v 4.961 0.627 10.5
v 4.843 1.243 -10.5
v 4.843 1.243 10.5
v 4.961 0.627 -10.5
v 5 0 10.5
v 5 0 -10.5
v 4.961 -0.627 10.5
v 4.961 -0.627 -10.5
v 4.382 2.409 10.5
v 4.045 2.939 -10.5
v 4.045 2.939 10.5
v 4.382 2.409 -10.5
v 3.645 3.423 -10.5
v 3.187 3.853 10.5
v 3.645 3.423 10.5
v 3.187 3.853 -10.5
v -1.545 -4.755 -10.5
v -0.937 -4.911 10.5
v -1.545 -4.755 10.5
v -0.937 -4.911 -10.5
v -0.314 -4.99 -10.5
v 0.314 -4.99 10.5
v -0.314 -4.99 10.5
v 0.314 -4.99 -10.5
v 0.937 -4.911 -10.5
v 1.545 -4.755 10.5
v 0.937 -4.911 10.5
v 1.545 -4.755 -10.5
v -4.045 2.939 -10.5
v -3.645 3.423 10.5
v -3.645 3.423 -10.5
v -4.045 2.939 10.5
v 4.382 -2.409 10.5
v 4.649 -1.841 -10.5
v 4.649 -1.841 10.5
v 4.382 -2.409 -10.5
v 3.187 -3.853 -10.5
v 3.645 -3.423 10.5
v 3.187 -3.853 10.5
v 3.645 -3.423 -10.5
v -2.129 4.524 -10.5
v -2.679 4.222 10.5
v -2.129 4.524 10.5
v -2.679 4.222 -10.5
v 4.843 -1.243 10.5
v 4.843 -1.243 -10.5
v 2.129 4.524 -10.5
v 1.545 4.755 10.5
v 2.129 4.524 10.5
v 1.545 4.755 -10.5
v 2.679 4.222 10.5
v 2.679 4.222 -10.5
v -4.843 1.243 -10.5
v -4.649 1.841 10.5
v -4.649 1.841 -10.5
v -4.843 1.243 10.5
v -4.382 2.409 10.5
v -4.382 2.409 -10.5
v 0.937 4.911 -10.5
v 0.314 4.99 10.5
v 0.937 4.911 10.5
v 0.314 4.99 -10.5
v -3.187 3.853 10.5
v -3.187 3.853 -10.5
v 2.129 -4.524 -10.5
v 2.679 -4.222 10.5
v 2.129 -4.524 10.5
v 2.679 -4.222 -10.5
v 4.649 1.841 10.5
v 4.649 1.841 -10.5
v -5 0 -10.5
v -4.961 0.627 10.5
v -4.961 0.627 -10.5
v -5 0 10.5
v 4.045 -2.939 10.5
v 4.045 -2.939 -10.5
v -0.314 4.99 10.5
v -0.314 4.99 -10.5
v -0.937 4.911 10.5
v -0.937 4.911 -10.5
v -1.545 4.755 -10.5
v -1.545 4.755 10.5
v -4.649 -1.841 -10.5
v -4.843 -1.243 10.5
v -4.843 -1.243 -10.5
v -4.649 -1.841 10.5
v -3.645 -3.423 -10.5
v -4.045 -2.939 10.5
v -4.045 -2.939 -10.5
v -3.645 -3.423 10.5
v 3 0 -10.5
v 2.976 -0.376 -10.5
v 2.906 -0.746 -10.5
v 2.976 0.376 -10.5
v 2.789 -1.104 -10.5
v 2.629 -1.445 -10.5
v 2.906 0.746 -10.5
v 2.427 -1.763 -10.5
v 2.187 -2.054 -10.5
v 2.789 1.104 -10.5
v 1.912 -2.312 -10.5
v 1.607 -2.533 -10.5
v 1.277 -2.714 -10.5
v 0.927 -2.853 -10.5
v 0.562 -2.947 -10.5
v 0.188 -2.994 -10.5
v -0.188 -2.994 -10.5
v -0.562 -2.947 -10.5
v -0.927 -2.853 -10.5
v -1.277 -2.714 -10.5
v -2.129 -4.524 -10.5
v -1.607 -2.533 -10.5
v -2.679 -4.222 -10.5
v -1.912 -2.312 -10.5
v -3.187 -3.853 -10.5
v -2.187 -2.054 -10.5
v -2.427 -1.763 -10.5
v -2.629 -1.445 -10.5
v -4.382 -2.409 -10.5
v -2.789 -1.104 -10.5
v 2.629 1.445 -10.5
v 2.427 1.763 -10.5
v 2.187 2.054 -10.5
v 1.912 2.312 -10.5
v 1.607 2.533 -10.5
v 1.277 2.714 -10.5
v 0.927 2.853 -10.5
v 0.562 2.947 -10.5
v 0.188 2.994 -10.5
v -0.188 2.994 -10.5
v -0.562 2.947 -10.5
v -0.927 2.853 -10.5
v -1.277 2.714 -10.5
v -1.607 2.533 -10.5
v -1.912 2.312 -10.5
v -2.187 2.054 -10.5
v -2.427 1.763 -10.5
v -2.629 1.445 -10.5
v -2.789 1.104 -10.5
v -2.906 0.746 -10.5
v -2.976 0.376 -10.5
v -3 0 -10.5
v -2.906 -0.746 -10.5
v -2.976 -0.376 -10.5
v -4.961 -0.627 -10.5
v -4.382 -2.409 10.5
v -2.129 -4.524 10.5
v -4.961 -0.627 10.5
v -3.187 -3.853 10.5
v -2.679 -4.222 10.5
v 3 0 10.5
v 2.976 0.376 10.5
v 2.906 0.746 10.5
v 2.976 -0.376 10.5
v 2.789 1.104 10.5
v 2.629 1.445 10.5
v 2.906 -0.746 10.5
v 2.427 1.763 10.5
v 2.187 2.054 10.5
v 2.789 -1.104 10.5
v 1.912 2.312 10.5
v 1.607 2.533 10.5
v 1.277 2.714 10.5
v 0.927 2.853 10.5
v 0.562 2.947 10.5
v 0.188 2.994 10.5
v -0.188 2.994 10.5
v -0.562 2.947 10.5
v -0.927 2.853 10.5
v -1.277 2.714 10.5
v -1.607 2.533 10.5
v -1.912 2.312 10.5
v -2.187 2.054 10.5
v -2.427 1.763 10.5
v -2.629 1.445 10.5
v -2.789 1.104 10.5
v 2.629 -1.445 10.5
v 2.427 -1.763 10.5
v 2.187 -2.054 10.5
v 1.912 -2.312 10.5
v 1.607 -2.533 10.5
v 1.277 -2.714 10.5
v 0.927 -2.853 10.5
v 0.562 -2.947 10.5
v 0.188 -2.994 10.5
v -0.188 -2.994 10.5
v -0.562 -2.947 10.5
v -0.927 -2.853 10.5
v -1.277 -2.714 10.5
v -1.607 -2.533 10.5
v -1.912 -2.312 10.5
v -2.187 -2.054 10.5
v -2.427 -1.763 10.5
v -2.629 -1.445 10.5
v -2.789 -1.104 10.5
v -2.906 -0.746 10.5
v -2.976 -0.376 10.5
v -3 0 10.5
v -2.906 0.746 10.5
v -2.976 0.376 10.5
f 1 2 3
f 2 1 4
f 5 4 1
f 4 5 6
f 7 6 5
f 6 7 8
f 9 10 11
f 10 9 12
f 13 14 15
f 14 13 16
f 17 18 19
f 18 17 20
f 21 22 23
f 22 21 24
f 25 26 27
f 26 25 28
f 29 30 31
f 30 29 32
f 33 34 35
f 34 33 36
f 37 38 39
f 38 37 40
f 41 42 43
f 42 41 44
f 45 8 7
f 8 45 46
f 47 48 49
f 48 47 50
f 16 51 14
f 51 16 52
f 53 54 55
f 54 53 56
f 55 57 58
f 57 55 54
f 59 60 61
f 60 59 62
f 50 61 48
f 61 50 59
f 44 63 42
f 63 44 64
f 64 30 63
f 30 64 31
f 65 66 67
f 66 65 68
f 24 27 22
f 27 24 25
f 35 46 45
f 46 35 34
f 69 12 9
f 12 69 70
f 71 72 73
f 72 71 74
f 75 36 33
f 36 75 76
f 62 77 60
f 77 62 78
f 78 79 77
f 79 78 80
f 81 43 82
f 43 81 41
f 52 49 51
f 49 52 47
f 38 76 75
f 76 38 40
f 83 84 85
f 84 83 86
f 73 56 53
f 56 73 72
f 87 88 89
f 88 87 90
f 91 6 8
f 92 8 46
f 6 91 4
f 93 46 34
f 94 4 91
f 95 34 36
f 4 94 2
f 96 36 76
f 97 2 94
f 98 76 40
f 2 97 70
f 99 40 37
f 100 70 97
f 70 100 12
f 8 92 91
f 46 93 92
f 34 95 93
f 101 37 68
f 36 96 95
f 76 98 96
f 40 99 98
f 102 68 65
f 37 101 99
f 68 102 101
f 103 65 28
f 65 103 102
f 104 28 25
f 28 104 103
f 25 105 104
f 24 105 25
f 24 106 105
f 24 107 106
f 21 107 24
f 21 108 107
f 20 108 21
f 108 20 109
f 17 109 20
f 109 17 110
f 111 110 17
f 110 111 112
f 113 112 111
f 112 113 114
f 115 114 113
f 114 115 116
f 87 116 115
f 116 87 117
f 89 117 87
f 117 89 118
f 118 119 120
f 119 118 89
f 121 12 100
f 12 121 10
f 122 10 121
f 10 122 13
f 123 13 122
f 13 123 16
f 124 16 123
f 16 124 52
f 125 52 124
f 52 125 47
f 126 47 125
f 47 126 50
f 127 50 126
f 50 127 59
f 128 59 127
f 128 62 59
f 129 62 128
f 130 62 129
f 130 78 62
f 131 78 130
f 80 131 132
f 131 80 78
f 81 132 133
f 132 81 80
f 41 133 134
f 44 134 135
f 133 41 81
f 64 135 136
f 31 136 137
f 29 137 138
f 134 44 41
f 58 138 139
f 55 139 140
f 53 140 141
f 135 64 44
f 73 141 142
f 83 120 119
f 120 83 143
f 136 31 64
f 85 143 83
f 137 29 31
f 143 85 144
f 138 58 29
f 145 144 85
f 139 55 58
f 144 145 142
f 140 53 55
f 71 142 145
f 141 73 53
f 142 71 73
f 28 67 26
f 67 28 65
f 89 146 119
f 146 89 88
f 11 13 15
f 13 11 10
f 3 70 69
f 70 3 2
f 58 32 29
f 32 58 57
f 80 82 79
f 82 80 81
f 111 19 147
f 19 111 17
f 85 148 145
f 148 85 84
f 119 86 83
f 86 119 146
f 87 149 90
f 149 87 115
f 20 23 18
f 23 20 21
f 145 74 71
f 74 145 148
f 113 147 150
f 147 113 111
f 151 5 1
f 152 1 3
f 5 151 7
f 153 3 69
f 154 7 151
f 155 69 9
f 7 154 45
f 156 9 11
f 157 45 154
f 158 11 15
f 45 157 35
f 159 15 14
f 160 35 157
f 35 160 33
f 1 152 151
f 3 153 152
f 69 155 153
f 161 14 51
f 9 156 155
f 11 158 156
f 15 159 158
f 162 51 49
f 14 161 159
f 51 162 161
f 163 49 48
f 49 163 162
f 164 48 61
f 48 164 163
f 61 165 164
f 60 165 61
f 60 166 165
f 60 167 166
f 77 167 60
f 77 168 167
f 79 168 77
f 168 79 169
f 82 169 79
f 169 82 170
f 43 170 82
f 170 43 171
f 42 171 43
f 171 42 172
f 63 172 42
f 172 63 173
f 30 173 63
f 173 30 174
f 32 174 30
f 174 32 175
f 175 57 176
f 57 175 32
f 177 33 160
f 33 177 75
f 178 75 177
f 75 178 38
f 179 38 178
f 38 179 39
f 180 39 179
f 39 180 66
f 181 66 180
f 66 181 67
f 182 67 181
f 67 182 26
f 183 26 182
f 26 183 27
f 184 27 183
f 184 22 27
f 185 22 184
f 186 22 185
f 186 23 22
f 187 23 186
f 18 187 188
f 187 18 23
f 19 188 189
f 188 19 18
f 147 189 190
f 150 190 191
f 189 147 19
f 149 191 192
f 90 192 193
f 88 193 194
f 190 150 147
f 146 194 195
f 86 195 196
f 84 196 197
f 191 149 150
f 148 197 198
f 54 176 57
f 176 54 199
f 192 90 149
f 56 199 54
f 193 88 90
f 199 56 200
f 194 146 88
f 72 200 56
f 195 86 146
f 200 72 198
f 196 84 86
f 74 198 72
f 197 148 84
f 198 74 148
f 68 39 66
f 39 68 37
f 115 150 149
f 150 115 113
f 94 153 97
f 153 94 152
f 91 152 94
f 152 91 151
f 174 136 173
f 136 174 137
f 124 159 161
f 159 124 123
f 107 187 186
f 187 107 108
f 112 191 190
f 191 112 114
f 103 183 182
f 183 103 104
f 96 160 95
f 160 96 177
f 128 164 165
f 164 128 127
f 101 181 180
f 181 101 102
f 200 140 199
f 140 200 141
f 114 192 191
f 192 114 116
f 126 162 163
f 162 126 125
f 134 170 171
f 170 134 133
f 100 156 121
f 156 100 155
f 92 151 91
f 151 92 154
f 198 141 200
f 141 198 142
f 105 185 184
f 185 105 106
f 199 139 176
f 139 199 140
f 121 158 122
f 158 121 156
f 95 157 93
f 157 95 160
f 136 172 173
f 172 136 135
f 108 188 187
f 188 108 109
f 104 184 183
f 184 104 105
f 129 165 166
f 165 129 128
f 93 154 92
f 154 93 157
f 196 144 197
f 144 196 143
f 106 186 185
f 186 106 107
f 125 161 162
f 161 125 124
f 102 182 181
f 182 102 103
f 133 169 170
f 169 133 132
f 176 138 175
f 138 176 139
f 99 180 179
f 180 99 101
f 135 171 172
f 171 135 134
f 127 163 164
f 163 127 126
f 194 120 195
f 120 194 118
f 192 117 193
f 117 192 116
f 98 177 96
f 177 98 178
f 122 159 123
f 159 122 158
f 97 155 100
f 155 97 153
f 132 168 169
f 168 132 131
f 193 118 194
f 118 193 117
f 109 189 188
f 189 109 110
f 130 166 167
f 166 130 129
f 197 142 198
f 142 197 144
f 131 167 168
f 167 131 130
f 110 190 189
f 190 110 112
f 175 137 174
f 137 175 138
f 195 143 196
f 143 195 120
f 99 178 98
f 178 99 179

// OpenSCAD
$fn = 50;


difference() {
	union() {
		translate(v = [0, 0, -10.5000000000]) {
			cylinder(h = 21, r = 5.0000000000);
		}
	}
	union() {
		translate(v = [0, 0, -100.0000000000]) {
			cylinder(h = 200, r = 3.0000000000);
		}
	}
}
